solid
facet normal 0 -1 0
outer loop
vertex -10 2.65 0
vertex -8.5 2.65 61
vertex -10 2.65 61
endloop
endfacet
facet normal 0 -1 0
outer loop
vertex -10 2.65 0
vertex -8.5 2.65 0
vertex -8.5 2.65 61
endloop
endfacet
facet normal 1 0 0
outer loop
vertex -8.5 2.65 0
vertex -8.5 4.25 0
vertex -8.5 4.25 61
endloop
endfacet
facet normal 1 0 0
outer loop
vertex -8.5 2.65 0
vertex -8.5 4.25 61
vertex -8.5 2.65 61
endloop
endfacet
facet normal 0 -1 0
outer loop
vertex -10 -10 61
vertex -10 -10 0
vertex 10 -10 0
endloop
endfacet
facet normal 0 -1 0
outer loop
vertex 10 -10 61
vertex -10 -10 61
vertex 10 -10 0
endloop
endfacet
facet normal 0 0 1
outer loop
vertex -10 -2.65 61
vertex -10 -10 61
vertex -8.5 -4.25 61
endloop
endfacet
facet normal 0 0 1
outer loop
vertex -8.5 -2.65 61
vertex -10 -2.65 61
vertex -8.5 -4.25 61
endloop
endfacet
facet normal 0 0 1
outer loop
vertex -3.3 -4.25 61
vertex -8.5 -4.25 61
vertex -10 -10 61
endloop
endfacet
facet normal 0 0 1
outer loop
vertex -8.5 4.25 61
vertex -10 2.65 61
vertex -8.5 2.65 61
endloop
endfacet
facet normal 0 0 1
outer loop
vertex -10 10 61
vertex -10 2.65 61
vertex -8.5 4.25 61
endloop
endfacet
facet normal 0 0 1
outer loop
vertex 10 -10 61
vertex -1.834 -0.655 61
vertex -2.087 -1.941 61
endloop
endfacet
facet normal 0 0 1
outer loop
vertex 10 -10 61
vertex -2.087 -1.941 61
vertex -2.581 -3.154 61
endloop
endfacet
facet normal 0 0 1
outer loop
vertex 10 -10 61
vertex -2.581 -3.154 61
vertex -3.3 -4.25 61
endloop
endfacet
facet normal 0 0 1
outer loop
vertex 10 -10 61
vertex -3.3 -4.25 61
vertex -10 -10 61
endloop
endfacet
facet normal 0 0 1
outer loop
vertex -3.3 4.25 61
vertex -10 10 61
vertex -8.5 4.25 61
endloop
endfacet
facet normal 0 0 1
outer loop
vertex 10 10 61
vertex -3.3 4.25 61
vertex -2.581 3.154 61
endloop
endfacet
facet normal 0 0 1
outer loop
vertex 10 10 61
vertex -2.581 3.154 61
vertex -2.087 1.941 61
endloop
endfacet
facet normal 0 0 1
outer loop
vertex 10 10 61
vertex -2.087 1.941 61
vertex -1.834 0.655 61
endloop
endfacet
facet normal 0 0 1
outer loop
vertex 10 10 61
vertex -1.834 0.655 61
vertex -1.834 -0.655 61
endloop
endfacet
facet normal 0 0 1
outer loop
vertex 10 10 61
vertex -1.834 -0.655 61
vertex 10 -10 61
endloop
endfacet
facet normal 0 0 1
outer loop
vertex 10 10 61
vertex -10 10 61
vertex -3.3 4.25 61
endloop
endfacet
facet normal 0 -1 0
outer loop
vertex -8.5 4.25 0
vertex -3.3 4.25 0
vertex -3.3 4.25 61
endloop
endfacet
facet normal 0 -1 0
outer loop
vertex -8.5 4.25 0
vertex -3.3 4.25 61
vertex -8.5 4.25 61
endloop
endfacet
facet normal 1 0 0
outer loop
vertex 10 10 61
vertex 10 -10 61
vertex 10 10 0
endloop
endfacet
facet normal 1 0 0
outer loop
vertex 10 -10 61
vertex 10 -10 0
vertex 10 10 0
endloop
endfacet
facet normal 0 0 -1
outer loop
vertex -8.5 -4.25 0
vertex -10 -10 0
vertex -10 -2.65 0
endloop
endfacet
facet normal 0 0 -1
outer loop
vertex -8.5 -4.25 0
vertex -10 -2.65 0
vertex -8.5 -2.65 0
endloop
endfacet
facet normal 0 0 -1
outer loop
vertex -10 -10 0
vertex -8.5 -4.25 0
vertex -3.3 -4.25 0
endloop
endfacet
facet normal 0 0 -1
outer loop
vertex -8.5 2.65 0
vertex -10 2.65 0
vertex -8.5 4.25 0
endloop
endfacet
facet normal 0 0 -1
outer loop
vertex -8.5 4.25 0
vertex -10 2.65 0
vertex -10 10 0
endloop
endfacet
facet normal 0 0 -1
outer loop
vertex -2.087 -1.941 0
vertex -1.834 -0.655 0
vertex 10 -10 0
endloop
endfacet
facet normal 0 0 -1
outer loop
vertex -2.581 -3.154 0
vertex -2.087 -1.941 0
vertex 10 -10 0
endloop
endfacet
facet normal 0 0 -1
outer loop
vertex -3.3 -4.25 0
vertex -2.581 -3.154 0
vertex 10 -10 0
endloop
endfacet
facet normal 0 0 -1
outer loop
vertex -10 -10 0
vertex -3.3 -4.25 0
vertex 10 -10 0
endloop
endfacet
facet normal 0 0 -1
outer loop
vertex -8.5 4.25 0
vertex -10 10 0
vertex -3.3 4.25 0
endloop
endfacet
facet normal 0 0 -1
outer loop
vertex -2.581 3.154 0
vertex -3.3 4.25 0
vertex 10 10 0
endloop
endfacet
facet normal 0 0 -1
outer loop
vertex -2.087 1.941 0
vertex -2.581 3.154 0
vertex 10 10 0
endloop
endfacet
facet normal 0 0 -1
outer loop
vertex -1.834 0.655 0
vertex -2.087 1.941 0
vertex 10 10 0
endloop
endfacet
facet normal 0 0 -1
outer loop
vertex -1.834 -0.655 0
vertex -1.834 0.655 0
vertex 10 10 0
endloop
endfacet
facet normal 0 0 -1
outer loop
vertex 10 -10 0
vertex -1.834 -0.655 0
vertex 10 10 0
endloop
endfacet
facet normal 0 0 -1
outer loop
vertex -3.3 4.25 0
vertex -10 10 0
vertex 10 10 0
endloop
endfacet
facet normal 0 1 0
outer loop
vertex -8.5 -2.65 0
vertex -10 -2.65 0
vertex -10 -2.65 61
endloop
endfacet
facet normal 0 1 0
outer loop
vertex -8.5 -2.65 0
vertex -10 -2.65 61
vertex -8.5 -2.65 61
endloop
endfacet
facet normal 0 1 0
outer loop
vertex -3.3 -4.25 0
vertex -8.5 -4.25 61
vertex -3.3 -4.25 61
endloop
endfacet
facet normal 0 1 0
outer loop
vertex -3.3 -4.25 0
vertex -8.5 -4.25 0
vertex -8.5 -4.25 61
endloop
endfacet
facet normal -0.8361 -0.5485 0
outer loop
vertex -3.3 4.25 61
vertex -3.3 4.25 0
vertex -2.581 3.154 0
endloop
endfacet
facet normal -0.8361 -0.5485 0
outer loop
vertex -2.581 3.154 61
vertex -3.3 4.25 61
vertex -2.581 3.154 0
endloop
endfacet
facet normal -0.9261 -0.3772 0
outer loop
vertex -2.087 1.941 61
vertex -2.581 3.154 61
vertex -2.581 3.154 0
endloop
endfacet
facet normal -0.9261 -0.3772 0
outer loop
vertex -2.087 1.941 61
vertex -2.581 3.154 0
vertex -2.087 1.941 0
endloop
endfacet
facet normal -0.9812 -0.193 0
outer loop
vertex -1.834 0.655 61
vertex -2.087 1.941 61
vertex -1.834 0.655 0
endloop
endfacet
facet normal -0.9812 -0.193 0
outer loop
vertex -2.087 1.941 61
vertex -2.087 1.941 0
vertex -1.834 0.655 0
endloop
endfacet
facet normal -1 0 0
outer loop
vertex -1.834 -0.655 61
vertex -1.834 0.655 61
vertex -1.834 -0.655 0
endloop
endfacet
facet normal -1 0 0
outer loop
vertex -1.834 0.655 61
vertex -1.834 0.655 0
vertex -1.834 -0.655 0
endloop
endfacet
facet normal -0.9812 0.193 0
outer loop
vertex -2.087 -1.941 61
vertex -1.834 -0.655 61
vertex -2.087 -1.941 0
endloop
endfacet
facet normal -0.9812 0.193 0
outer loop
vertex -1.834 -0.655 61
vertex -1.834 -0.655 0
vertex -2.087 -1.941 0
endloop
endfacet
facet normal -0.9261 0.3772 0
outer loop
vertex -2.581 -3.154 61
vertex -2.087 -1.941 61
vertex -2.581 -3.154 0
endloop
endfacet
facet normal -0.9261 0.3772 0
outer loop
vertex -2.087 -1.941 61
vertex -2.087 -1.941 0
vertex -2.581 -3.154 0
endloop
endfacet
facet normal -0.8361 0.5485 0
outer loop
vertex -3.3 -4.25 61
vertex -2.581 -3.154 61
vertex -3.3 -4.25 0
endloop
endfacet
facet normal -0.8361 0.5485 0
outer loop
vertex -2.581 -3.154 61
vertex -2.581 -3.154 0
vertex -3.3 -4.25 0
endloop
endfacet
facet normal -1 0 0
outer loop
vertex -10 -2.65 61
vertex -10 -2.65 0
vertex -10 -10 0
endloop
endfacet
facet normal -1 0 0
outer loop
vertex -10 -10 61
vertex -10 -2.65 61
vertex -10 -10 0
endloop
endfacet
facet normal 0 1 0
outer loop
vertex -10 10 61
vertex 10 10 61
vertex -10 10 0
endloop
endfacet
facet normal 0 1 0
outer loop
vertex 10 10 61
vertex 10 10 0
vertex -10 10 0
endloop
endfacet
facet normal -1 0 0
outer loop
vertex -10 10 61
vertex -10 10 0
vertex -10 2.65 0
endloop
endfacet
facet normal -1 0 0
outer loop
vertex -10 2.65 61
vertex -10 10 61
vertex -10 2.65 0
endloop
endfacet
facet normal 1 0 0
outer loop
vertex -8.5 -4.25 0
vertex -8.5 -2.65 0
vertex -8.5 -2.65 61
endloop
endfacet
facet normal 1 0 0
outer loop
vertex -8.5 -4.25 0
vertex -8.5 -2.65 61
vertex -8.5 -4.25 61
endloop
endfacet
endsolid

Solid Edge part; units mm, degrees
sketch "Sketch1" plane through (0, 0, 0) normal (0, 0, 1) x (1, 0, 0)
  line L0 (-10, -10) -> (10, -10)
  line L1 (10, -10) -> (10, 10)
  line L2 (10, 10) -> (-10, 10)
  line L3 (-10, 10) -> (-10, 2.65)
  line L4 (-8.5, 2.65) -> (-10, 2.65)
  line L5 (-8.5, 4.25) -> (-8.5, 2.65)
  line L6 (-3.3, 4.25) -> (-8.5, 4.25)
  arc A0 (-3.3, 4.25) -> (-3.3, -4.25) centre (-8.5833, 0) cw
  line L7 (-8.5, -4.25) -> (-3.3, -4.25)
  line L8 (-8.5, -2.65) -> (-8.5, -4.25)
  line L9 (-10, -2.65) -> (-8.5, -2.65)
  line L10 (-10, -2.65) -> (-10, -10)
extrude "Protrusion1" add sketch "Sketch1" along normal blind 61
